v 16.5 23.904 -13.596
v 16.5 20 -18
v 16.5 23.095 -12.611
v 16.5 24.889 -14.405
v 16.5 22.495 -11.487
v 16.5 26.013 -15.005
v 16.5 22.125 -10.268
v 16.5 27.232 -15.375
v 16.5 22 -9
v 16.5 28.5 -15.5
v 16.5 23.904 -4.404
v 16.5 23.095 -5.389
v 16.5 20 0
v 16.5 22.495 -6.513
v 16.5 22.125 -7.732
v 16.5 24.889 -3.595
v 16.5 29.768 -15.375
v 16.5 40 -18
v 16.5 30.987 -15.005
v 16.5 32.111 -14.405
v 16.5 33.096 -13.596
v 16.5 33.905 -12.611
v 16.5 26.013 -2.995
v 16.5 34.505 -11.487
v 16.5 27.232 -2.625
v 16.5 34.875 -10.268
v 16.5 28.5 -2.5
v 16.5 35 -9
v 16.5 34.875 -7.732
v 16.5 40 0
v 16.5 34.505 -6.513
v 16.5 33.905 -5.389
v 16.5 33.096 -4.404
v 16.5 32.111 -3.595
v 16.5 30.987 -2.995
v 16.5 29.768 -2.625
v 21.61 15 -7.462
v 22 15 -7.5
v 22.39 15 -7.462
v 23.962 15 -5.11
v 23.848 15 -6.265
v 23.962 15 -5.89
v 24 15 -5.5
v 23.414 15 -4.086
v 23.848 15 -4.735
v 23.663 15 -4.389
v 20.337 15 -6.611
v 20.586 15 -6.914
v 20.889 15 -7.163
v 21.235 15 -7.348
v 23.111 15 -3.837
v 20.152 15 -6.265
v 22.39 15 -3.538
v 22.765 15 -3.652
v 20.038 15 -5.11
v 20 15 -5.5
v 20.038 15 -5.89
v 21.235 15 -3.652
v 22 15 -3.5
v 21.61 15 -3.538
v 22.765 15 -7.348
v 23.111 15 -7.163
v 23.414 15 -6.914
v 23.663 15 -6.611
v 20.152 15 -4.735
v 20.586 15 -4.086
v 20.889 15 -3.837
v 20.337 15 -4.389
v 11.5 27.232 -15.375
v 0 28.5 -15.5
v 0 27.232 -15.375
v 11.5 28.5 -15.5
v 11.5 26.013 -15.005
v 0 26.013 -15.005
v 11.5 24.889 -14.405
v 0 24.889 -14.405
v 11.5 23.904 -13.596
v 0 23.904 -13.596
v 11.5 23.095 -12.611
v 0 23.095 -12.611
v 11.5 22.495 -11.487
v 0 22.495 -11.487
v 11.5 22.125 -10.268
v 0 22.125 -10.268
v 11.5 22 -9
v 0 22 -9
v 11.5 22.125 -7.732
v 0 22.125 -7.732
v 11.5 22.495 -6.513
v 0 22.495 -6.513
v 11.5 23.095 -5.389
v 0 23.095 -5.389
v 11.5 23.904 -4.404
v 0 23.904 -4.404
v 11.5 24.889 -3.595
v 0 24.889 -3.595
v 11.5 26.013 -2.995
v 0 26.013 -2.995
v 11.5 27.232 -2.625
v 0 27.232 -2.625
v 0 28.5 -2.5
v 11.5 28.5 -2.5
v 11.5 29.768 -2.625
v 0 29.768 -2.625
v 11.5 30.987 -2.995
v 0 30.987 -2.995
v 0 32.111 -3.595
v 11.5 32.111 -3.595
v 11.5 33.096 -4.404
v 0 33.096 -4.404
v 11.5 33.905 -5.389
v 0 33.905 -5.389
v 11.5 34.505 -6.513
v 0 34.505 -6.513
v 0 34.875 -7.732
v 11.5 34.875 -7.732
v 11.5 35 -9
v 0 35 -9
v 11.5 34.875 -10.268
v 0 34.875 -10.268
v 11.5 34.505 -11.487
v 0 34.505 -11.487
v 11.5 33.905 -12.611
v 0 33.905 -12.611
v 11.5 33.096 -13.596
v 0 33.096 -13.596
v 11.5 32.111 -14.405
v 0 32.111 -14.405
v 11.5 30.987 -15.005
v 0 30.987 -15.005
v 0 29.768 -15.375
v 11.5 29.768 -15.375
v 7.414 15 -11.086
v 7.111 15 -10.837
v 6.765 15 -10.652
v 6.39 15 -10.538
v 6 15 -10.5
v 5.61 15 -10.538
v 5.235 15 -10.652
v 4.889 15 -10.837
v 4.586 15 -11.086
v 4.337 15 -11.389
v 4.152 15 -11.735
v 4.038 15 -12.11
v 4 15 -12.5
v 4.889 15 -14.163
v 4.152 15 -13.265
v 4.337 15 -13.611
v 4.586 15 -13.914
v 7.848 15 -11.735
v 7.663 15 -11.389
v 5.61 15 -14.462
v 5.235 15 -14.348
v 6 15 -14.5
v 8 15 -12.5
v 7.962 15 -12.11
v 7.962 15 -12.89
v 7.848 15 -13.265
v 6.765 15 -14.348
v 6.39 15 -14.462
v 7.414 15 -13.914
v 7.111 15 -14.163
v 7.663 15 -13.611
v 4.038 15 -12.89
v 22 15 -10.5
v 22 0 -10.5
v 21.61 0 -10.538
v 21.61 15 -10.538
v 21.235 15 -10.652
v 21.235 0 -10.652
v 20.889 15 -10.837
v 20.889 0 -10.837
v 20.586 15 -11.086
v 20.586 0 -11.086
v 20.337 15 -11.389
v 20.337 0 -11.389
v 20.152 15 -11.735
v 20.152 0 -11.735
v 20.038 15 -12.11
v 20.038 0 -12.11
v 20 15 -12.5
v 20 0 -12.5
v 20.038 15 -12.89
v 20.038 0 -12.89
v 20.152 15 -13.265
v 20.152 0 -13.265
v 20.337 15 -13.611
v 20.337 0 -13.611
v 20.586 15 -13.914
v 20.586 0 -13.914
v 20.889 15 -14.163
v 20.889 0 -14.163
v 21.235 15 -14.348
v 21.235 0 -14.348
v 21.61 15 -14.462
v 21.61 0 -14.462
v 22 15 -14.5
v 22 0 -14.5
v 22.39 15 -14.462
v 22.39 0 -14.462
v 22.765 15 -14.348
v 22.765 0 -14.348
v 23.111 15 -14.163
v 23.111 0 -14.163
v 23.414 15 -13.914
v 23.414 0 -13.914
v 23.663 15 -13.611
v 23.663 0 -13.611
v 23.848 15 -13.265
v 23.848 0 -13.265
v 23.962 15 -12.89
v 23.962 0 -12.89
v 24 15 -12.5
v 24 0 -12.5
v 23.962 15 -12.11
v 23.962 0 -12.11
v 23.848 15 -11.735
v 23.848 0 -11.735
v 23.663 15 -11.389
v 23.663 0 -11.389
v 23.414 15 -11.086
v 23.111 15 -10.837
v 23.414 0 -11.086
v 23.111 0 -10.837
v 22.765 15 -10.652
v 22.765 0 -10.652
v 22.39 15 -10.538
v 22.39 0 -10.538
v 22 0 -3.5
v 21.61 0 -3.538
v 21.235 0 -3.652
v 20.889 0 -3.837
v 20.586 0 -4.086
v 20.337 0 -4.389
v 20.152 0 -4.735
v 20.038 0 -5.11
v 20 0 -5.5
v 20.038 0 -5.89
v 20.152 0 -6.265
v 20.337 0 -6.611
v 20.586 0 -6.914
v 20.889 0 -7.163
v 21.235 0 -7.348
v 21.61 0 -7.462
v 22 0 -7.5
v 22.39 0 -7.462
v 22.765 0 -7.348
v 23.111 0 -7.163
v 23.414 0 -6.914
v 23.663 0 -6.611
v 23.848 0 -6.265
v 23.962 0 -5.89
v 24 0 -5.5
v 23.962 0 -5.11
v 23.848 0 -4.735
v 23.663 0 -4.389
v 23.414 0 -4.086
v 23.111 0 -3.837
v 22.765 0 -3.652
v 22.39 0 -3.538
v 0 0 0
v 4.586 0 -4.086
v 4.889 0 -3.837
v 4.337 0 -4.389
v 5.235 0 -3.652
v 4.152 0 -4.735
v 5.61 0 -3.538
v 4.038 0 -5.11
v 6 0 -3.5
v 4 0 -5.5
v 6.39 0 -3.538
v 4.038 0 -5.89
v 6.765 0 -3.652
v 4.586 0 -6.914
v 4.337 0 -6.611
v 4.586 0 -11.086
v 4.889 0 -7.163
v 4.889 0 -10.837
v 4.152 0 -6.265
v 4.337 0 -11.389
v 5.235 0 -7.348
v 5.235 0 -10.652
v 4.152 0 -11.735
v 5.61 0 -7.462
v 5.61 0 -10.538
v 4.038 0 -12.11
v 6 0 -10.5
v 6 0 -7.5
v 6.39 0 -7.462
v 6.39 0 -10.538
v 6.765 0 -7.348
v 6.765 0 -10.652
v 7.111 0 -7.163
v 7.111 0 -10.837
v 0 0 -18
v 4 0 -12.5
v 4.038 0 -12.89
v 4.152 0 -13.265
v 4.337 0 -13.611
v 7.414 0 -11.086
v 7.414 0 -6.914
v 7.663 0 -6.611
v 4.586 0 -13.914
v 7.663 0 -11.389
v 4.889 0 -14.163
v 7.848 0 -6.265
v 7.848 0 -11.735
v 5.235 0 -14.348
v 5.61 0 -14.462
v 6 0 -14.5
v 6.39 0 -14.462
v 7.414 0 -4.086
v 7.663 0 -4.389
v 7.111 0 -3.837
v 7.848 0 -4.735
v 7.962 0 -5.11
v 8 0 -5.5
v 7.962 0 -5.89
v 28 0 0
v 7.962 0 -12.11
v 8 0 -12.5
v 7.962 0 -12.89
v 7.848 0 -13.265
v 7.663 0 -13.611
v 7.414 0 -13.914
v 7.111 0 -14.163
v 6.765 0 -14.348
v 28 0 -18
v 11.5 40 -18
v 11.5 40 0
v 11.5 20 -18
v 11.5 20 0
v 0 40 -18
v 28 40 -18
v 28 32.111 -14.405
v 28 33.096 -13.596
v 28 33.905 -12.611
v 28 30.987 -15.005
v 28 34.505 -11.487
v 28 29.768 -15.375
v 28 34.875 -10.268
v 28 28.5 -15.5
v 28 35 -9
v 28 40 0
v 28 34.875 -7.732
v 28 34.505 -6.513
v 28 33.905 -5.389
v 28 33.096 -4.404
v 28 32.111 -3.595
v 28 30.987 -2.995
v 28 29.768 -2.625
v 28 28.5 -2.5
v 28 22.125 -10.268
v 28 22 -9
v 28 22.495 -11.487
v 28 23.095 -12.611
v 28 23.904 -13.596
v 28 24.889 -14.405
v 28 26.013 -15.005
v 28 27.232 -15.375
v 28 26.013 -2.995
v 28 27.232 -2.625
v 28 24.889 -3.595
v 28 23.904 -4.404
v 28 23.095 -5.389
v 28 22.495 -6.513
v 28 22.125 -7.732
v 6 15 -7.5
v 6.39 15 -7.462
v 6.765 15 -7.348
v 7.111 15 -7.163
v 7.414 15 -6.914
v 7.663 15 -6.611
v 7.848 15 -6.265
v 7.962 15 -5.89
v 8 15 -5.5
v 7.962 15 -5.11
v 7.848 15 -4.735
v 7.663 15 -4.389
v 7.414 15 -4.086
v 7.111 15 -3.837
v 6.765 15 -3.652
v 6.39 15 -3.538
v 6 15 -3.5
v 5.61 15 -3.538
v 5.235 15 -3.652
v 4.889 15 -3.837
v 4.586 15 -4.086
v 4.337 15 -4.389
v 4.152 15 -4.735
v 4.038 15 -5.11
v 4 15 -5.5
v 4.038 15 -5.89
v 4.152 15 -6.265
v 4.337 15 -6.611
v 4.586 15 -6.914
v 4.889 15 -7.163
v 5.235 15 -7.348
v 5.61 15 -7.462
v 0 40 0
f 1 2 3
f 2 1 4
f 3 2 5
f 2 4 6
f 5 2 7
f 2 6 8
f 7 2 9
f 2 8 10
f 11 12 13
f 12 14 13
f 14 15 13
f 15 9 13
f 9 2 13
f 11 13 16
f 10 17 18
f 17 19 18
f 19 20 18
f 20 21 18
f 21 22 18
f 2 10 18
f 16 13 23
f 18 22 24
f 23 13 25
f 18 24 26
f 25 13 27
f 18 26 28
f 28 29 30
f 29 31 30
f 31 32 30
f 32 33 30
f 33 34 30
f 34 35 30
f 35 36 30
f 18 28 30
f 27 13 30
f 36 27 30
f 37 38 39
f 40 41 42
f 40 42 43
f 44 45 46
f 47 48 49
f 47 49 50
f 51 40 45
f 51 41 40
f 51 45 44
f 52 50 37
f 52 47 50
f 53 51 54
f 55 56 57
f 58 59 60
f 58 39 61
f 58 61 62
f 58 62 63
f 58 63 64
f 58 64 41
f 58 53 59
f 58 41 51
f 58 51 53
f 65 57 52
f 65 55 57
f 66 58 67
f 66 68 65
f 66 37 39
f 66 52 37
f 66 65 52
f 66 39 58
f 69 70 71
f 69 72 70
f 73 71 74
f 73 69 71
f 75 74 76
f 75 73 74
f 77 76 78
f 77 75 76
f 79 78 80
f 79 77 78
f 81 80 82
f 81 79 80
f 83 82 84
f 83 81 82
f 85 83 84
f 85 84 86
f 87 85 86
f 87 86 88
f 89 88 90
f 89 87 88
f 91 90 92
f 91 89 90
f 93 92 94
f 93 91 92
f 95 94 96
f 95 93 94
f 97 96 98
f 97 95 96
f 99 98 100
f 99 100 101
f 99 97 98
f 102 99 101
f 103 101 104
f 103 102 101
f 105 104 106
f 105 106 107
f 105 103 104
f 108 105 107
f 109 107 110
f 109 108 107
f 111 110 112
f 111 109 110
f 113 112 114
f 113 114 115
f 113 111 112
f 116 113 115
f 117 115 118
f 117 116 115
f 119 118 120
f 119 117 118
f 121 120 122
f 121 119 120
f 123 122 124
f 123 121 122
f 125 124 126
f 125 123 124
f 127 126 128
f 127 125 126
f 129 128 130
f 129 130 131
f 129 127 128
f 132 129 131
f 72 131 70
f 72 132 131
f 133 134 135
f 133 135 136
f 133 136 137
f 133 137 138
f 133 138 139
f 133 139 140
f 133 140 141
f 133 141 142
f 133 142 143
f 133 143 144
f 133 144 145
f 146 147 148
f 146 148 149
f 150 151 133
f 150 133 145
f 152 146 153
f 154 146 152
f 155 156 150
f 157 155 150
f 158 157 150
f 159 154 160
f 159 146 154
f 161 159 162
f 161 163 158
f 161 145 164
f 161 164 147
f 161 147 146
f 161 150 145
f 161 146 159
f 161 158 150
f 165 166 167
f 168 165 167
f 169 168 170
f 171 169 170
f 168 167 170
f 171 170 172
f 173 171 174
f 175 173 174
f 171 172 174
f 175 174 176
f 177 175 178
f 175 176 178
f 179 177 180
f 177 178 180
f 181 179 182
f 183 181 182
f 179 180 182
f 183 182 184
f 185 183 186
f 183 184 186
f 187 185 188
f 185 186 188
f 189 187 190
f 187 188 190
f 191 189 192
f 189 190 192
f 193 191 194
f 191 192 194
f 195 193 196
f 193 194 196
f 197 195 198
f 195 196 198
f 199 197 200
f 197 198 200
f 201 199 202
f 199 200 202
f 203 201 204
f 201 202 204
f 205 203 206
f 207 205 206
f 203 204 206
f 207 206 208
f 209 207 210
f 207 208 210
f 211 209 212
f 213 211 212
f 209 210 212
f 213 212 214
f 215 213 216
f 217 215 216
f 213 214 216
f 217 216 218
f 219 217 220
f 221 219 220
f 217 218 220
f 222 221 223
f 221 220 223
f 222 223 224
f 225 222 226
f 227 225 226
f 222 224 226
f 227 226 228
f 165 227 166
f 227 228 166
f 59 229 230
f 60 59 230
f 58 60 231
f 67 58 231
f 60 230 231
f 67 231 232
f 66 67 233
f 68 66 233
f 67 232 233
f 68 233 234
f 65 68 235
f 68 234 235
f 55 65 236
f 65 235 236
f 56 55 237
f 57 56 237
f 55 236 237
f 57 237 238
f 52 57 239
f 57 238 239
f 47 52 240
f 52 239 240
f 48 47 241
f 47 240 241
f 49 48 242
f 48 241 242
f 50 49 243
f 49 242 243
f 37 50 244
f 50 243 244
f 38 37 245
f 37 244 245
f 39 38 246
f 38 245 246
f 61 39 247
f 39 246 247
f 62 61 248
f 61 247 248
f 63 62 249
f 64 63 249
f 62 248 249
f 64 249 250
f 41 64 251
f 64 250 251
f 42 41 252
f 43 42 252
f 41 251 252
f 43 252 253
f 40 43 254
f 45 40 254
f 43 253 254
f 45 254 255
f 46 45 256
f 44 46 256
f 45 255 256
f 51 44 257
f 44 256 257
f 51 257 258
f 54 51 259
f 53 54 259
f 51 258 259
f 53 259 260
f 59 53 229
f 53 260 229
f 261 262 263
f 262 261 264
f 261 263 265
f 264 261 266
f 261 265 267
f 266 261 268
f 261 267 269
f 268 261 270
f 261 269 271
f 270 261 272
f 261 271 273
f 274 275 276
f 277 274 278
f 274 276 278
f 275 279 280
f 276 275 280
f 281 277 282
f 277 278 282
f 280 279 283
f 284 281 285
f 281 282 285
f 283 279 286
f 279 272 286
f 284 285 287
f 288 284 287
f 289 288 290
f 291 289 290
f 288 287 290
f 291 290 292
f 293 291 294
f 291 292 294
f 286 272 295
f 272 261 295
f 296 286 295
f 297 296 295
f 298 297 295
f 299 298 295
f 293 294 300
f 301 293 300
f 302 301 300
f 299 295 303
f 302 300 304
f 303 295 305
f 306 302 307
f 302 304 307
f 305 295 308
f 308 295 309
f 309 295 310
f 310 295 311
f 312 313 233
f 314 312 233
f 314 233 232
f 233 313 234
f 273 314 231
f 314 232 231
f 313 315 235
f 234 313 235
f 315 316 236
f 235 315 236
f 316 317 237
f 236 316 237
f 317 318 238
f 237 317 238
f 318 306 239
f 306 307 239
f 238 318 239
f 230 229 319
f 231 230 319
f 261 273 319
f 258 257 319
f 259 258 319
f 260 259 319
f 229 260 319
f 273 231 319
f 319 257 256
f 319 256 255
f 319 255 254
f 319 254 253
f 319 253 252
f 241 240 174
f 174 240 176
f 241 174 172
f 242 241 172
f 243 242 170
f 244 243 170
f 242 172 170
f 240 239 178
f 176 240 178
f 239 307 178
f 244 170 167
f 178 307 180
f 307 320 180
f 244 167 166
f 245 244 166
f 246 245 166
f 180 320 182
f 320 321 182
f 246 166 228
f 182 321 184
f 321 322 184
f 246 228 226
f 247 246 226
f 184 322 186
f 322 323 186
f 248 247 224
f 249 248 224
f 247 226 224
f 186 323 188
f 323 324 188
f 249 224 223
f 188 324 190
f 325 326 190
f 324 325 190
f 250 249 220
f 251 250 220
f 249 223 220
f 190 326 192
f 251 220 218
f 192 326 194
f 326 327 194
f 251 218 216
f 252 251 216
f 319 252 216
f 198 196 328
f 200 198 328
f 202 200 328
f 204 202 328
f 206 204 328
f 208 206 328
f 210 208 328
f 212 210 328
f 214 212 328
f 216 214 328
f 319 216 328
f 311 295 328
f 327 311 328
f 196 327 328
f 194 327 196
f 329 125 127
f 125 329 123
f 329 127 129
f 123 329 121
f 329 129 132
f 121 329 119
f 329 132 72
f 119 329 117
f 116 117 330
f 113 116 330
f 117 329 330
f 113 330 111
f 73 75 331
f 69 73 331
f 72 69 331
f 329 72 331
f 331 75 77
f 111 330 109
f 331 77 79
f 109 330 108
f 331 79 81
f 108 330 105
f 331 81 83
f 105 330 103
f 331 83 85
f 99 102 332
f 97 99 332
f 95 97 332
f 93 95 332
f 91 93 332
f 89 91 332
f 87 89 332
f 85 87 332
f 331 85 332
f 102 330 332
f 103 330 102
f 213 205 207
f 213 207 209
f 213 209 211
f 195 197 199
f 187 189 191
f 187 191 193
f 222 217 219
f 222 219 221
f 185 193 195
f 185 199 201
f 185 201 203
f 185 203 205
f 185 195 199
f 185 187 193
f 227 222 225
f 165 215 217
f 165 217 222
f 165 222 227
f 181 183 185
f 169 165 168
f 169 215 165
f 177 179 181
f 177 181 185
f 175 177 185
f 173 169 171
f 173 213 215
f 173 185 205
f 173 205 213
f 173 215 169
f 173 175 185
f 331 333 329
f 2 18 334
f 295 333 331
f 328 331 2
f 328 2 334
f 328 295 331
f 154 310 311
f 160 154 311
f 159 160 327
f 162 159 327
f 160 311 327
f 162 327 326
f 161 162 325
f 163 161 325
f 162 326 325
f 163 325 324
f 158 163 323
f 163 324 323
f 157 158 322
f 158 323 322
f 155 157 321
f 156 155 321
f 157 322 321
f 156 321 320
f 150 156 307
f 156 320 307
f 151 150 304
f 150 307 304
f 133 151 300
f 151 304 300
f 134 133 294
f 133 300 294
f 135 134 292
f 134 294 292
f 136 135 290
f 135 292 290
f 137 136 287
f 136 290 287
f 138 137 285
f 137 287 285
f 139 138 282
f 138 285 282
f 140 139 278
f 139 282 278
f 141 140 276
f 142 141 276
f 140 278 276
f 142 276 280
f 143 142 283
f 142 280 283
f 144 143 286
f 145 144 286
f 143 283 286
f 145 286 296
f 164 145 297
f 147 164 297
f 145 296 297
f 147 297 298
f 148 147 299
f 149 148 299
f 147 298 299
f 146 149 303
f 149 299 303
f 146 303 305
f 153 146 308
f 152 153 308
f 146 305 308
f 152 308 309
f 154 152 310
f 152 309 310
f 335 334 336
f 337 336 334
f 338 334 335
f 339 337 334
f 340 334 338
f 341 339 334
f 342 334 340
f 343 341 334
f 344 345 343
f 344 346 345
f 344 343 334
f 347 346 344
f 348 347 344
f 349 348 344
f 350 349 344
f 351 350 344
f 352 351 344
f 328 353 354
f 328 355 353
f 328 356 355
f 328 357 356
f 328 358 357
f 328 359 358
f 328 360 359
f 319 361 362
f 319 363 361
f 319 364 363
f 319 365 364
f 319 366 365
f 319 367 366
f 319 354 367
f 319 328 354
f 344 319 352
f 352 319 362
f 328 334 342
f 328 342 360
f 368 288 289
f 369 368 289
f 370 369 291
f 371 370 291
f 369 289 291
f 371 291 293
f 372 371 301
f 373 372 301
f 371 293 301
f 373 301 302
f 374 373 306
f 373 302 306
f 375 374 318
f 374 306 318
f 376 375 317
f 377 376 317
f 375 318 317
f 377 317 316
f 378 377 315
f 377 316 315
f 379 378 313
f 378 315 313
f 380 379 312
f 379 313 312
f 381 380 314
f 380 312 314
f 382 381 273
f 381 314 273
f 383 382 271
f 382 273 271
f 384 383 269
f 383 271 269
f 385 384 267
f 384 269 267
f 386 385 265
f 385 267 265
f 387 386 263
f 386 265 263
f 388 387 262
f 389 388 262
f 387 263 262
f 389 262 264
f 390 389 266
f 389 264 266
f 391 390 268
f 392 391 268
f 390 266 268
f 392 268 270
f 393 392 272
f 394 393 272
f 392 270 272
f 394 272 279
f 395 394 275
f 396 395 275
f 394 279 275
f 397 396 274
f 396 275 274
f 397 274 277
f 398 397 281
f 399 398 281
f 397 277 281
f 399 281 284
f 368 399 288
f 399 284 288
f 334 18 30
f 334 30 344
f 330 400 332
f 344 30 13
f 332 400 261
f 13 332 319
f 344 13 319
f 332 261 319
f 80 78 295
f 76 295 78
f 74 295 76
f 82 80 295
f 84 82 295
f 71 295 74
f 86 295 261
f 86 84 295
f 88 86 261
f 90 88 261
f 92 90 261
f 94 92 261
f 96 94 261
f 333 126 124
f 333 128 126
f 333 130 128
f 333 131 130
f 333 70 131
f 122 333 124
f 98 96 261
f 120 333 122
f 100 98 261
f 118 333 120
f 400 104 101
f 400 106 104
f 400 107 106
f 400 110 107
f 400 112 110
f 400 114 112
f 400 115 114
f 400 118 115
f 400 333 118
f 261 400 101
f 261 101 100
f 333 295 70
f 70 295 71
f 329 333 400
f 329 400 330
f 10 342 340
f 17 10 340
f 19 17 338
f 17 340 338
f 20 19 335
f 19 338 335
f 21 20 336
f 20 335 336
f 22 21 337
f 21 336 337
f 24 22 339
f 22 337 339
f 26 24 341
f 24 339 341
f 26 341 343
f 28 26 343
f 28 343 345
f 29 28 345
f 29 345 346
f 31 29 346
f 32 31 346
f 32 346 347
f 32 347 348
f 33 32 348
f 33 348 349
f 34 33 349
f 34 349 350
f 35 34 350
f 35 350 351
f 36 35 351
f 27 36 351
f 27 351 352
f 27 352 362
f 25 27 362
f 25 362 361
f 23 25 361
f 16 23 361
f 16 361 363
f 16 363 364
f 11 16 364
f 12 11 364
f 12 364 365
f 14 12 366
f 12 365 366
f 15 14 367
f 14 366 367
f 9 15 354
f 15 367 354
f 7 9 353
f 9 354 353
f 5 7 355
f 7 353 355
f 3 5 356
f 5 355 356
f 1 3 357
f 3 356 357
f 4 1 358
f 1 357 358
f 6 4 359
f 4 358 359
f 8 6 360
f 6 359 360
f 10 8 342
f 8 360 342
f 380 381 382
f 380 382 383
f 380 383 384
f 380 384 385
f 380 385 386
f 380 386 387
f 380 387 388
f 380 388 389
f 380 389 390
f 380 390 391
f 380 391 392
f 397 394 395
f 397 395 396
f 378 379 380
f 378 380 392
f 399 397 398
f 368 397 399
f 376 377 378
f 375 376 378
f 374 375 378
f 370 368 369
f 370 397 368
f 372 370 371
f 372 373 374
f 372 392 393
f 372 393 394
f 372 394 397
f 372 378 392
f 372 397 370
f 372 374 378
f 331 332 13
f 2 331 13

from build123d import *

# Parameters (mm, degrees)
SKETCH_1_W          = 28
SKETCH_1_H          = 18
EXTRUDE_1_DEPTH     = 40
SKETCH_2_R          = 2
CUT_EXTRUDE_1_DEPTH = 15
SKETCH_4_R          = 7.5
CUT_EXTRUDE_2_DEPTH = 1.2
SKETCH_5_R          = 6.5
CUT_EXTRUDE_3_DEPTH = 3.2
CUT_EXTRUDE_4_REACH = 51.809
SKETCH_6_R          = 2.5
CUT_EXTRUDE_START   = -1.2
SKETCH_7_R          = 7.5
CUT_EXTRUDE_5_DEPTH = 1.2
CUT_EXTRUDE_START_2 = -3.2
SKETCH_8_R          = 6.5
CUT_EXTRUDE_6_DEPTH = 3.2
CUT_EXTRUDE_7_DEPTH = 53.038447325
EXTRUDE_START       = 1.2
SKETCH_10_R         = 7.5
SKETCH_10_R_2       = 6.5
EXTRUDE_2_DEPTH     = 1.2
SKETCH_11_R         = 7.5
SKETCH_11_R_2       = 6.5
EXTRUDE_3_DEPTH     = 1.2
CUT_EXTRUDE_START_3 = -19.2
SKETCH_12_R         = 6.5
CUT_EXTRUDE_8_DEPTH = 19.2


with BuildPart() as part:
    # 草图1 → 凸台-拉伸1 (new body)
    with BuildSketch(Plane(origin=(0, 0, 0), x_dir=(1, 0, 0), z_dir=(0, 1, 0))):
        with Locations((14, 9)):
            Rectangle(SKETCH_1_W, SKETCH_1_H)
    extrude(amount=EXTRUDE_1_DEPTH)

    # 草图2 → 切除-拉伸1 (cut)
    with BuildSketch(Plane.XZ):
        with Locations(Location((6, -5.5, 0), (0, 0, 270))):
            Circle(SKETCH_2_R)
        with Locations(Location((6, -12.5, 0), (0, 0, 270))):
            Circle(SKETCH_2_R)
        with Locations(Location((22, -12.5, 0), (0, 0, 90))):
            Circle(SKETCH_2_R)
        with Locations(Location((22, -5.5, 0), (0, 0, 90))):
            Circle(SKETCH_2_R)
    extrude(amount=-CUT_EXTRUDE_1_DEPTH, mode=Mode.SUBTRACT)

    # 草图4 → 切除-拉伸2 (cut)
    with BuildSketch(Plane(origin=(28, 0, 0), x_dir=(0, 0, -1), z_dir=(1, 0, 0))):
        with Locations((9, 28.5)):
            Circle(SKETCH_4_R)
    extrude(amount=-CUT_EXTRUDE_2_DEPTH, mode=Mode.SUBTRACT)

    # 草图5 → 切除-拉伸3 (cut)
    with BuildSketch(Plane(origin=(26.8, 0, 0), x_dir=(0, 0, -1), z_dir=(1, 0, 0))):
        with Locations((9, 28.5)):
            Circle(SKETCH_5_R)
    extrude(amount=-CUT_EXTRUDE_3_DEPTH, mode=Mode.SUBTRACT)

    # 草图6 → 切除-拉伸4 (cut, up to next)
    with BuildSketch(Plane(origin=(23.6, 0, 0), x_dir=(0, 0, -1), z_dir=(1, 0, 0)), mode=Mode.PRIVATE) as cut_extrude_4_sk1:
        with Locations((9, 28.5)):
            Circle(SKETCH_6_R)
    cut_extrude_4_tool1 = extrude(cut_extrude_4_sk1.sketch, amount=-CUT_EXTRUDE_4_REACH, mode=Mode.PRIVATE) & part.part
    add(cut_extrude_4_tool1.solids().sort_by_distance((23.6, 28.5, -9))[0], mode=Mode.SUBTRACT)

    # 草图7 → 切除-拉伸5 (cut)
    with BuildSketch(Plane.ZY.offset(CUT_EXTRUDE_START)):
        with Locations(Location((-9, 28.5, 0), (0, 0, 180))):
            Circle(SKETCH_7_R)
    extrude(amount=CUT_EXTRUDE_5_DEPTH, mode=Mode.SUBTRACT)

    # 草图8 → 切除-拉伸6 (cut)
    with BuildSketch(Plane.ZY.offset(-1.2).offset(CUT_EXTRUDE_START_2)):
        with Locations(Location((-9, 28.5, 0), (0, 0, 180))):
            Circle(SKETCH_8_R)
    extrude(amount=CUT_EXTRUDE_6_DEPTH, mode=Mode.SUBTRACT)

    # 草图9 → 切除-拉伸7 (cut, through all)
    with BuildSketch(Plane.XY):
        Polygon((14, 40), (11.5, 40), (11.5, 20), (16.5, 20), (16.5, 40), align=None)
    extrude(amount=-CUT_EXTRUDE_7_DEPTH, mode=Mode.SUBTRACT)

    # 草图10 → 凸台-拉伸2 (add)
    with BuildSketch(Plane(origin=(26.8, 0, 0), x_dir=(0, 0, -1), z_dir=(1, 0, 0)).offset(EXTRUDE_START)):
        with Locations(Location((9, 28.5, 0), (0, 0, 180))):
            Circle(SKETCH_10_R)
        with Locations((9, 28.5)):
            Circle(SKETCH_10_R_2, mode=Mode.SUBTRACT)
    extrude(amount=-EXTRUDE_2_DEPTH)

    # 草图11 → 凸台-拉伸3 (add)
    with BuildSketch(Plane.ZY.offset(-1.2)):
        with Locations((-9, 28.5)):
            Circle(SKETCH_11_R)
        with Locations(Location((-9, 28.5, 0), (0, 0, 180))):
            Circle(SKETCH_11_R_2, mode=Mode.SUBTRACT)
    extrude(amount=EXTRUDE_3_DEPTH)

    # 草图12 → 切除-拉伸8 (cut)
    with BuildSketch(Plane.ZY.offset(-4.4).offset(CUT_EXTRUDE_START_3)):
        with Locations(Location((-9, 28.5, 0), (0, 0, 180))):
            Circle(SKETCH_12_R)
    extrude(amount=CUT_EXTRUDE_8_DEPTH, mode=Mode.SUBTRACT)


solid = part.part
